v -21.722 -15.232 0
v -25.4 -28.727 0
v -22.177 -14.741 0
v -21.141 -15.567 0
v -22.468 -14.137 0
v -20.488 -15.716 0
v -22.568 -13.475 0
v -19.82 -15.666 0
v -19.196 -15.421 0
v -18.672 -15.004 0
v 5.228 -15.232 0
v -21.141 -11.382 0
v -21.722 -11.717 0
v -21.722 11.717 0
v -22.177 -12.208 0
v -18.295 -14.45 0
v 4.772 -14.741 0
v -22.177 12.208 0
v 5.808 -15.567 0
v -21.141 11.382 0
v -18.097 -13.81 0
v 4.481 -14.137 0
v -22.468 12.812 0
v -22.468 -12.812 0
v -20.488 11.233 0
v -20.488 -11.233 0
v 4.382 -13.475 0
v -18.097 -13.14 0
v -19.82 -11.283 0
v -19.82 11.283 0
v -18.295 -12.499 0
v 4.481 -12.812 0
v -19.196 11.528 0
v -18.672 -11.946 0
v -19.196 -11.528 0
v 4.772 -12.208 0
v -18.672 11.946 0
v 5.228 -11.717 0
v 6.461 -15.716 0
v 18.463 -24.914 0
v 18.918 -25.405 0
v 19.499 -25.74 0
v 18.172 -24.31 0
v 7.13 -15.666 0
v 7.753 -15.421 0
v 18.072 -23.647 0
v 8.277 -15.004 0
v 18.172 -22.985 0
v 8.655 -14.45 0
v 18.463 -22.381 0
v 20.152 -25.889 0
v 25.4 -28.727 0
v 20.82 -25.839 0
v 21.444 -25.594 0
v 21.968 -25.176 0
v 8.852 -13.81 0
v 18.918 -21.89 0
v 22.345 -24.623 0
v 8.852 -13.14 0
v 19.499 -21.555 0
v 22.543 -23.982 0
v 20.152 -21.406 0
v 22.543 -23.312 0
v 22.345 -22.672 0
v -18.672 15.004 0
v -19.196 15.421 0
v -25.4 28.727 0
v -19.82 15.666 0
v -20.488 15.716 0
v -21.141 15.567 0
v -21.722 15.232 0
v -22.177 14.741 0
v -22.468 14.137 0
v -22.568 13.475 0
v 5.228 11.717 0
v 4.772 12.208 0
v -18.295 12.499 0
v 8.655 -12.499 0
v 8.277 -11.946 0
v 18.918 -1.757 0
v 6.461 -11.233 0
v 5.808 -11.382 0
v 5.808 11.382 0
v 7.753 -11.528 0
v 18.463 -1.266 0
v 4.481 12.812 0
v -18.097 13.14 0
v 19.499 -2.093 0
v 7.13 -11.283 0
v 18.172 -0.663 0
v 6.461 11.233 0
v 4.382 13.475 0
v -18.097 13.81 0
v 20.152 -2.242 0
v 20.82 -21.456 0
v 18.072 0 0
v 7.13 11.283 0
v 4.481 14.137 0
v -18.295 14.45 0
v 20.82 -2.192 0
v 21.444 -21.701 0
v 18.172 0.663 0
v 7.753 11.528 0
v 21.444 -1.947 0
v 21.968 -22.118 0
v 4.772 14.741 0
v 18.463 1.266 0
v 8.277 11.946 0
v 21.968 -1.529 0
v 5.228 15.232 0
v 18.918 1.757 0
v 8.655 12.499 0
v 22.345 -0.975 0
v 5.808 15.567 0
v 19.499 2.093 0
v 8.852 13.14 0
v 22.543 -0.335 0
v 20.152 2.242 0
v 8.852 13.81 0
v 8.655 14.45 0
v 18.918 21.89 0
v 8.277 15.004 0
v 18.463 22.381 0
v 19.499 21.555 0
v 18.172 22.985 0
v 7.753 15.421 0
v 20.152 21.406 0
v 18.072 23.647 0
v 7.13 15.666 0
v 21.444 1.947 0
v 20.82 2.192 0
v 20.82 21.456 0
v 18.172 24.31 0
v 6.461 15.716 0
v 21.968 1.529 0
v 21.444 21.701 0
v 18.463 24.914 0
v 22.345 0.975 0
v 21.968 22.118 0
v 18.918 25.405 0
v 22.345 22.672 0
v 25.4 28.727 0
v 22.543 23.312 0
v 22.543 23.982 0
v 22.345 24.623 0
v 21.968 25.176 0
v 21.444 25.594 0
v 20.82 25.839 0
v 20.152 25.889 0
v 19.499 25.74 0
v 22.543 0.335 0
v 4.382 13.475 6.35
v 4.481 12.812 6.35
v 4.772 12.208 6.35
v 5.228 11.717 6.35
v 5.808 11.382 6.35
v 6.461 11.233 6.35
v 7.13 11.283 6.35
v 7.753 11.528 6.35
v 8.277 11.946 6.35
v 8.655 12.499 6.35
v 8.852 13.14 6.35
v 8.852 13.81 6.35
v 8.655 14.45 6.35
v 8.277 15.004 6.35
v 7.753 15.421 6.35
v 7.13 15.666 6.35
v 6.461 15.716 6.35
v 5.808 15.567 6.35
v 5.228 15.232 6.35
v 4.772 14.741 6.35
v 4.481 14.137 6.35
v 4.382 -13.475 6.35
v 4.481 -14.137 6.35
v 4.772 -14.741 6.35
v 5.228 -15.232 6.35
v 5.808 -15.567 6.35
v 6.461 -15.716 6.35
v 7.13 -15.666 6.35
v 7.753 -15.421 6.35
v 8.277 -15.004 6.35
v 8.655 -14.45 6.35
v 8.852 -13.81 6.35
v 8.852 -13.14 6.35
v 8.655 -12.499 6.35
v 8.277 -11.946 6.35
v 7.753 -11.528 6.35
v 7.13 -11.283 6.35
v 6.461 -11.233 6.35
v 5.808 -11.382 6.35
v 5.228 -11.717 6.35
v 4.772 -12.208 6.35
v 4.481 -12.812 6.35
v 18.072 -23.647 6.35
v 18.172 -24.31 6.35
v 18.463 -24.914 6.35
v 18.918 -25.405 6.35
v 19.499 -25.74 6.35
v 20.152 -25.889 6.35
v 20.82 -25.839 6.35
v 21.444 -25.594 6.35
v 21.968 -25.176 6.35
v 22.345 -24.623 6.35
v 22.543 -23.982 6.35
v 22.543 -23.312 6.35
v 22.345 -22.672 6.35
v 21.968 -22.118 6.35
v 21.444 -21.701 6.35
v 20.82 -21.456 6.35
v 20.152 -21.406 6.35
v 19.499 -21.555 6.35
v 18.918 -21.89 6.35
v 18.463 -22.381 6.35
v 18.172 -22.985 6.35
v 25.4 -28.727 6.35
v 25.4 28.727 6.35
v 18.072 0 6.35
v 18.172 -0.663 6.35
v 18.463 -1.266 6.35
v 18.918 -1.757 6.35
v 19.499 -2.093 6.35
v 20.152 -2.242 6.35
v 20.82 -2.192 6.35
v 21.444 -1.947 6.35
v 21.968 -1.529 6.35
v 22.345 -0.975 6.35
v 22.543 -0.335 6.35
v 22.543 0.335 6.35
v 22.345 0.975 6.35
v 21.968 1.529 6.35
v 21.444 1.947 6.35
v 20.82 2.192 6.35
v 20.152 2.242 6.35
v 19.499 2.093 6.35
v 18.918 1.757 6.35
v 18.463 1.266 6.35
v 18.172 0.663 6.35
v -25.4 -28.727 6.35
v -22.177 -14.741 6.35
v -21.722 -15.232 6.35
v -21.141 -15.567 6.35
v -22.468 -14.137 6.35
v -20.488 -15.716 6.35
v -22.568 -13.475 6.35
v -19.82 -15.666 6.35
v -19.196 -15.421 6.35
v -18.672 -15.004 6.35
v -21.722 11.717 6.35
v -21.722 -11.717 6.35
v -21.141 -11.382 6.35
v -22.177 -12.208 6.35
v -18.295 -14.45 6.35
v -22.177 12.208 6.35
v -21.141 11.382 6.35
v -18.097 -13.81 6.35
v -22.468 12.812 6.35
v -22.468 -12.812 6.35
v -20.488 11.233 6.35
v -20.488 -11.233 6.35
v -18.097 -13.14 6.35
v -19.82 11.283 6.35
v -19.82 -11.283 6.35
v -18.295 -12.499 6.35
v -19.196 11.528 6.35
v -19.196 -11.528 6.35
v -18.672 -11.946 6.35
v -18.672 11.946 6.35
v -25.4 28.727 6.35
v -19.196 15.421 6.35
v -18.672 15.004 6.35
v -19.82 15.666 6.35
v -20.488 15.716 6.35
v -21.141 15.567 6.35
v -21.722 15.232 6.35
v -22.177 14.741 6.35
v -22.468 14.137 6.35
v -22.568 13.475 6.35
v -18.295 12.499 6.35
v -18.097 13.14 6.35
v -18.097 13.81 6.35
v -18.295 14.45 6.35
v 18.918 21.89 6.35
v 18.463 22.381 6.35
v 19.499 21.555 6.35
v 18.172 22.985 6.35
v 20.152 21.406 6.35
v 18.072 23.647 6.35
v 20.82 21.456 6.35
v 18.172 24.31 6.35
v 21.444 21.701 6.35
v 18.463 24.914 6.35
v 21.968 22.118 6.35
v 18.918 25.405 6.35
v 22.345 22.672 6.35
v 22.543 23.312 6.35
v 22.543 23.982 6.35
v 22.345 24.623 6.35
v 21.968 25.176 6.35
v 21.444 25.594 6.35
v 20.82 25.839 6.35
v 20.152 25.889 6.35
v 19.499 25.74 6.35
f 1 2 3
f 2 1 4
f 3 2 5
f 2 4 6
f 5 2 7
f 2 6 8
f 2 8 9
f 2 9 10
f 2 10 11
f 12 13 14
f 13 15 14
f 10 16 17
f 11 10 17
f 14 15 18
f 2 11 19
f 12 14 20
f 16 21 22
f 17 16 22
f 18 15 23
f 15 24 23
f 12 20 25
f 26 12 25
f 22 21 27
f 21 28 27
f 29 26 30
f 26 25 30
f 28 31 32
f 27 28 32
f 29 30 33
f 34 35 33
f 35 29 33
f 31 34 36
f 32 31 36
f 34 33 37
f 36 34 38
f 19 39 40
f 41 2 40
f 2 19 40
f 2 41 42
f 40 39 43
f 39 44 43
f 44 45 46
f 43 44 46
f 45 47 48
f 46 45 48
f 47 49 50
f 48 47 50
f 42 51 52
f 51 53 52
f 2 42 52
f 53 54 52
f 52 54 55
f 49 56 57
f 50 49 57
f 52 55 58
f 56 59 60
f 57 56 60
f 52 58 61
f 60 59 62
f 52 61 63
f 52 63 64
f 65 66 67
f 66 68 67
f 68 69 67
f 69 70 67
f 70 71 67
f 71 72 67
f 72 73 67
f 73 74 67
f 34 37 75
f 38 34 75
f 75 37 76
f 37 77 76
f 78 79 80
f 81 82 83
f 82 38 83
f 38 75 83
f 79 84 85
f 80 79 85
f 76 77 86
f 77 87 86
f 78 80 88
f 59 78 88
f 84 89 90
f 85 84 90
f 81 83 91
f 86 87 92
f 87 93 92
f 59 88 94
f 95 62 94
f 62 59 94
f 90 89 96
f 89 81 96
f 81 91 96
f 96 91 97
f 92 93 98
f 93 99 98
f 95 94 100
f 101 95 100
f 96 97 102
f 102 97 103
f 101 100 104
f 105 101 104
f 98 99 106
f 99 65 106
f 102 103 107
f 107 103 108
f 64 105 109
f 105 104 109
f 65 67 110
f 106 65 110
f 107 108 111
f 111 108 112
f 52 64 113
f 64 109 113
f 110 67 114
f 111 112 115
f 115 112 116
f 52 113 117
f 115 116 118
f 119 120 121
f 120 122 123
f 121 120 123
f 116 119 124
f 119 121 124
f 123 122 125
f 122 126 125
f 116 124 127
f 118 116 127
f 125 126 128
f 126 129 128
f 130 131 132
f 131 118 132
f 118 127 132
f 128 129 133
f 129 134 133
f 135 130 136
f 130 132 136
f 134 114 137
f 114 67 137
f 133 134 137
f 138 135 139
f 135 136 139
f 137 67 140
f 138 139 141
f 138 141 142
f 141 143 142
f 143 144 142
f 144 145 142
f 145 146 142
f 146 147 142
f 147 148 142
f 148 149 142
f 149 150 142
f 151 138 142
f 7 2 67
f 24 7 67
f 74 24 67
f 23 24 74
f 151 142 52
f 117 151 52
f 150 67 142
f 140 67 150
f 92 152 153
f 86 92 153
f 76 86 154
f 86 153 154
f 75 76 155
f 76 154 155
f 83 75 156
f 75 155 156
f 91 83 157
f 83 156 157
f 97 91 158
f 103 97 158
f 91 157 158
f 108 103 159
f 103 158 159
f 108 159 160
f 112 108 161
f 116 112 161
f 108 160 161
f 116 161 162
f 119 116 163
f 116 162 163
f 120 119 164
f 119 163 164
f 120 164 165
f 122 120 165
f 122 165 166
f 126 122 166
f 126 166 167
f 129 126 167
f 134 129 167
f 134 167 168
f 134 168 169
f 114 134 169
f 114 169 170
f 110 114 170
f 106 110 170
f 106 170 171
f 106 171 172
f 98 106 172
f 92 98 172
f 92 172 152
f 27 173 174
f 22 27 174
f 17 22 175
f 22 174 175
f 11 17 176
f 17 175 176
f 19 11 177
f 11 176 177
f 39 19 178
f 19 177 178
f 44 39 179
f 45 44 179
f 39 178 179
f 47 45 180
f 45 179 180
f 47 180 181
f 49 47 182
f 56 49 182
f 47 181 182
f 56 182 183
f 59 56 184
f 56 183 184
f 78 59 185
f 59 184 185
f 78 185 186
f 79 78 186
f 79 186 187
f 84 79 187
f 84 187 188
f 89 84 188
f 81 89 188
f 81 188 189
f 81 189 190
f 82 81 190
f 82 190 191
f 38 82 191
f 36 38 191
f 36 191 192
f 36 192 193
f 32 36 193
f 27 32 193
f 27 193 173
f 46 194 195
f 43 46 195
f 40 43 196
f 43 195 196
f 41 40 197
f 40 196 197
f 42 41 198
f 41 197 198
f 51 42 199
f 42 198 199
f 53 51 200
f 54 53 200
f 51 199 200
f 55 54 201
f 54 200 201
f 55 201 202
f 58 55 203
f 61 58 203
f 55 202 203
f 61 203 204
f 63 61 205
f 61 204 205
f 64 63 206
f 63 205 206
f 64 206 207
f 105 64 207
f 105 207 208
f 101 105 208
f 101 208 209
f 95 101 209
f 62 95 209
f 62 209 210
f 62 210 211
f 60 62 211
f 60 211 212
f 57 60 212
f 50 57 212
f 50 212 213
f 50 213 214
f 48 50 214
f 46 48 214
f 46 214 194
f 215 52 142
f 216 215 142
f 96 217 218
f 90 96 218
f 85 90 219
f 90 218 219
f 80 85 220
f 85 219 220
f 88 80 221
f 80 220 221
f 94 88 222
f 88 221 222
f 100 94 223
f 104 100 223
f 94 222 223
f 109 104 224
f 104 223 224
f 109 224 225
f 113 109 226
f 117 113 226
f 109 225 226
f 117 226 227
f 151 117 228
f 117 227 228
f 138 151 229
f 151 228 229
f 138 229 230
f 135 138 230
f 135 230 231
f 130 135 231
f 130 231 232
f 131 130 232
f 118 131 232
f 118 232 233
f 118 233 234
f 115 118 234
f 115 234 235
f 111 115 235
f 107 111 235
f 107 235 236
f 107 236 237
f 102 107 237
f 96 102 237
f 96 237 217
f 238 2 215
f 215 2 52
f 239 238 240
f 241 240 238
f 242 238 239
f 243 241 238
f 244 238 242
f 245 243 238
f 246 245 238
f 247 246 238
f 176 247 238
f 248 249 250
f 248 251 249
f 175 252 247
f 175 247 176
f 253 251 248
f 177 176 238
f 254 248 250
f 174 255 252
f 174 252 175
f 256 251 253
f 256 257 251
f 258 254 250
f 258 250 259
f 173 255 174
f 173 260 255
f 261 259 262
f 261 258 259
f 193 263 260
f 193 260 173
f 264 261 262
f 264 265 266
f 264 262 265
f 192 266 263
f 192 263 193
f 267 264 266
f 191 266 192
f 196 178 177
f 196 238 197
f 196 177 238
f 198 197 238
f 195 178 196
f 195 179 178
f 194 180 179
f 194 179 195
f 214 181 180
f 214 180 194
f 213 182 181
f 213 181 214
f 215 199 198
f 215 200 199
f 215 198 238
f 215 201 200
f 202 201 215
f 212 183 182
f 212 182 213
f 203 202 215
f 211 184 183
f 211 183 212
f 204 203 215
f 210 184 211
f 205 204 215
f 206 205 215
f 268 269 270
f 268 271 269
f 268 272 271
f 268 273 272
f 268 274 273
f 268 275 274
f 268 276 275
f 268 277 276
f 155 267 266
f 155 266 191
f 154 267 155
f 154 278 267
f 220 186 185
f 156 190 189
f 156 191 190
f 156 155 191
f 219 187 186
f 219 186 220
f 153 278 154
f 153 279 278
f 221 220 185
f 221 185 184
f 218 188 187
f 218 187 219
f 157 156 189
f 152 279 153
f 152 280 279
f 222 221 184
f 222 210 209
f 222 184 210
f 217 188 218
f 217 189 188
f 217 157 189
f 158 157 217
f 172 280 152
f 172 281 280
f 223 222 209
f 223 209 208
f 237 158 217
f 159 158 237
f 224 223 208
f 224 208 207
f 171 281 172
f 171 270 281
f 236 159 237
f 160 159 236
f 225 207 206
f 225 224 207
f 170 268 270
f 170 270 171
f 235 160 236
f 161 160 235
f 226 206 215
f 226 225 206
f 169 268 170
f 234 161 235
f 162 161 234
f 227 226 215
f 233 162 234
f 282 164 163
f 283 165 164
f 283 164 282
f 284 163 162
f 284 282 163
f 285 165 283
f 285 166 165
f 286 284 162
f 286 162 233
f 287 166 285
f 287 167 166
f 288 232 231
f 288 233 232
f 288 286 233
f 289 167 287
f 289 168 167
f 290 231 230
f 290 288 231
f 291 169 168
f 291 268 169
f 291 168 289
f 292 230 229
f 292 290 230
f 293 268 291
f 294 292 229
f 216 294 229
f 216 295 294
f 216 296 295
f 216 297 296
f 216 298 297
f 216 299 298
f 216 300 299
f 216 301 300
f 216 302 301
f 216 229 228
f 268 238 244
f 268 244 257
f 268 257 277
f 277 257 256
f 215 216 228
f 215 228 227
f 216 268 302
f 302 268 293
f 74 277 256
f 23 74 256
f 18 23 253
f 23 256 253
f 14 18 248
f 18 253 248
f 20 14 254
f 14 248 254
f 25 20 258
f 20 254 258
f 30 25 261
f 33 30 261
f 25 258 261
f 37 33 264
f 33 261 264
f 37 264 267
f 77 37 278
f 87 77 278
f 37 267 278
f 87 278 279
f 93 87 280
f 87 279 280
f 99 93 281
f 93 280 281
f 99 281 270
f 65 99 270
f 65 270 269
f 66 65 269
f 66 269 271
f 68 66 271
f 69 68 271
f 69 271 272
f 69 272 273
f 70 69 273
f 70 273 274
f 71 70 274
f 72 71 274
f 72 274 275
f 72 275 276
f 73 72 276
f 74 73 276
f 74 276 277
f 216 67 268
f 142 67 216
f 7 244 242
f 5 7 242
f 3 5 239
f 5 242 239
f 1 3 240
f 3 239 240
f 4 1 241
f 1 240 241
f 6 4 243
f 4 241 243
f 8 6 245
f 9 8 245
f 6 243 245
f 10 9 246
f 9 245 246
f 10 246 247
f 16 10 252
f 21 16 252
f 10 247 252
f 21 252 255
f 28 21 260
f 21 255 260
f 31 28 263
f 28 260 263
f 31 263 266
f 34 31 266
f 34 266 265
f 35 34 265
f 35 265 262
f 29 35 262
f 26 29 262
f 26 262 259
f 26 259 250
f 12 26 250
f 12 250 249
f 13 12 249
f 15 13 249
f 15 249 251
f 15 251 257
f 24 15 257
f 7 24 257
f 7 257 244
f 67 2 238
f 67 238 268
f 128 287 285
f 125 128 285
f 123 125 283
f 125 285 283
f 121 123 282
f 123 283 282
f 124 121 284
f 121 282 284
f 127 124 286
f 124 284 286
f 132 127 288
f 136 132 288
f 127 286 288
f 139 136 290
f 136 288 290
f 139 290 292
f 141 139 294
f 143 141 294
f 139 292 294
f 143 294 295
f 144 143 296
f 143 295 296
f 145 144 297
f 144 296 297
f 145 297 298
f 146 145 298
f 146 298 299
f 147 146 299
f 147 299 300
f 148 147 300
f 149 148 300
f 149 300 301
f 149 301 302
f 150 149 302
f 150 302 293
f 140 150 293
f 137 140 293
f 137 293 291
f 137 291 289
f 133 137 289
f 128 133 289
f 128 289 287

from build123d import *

# Parameters (mm, degrees)
F0_W     = 50.8
F0_H     = 57.4548
F1_DEPTH = 6.35
F2_D     = 4.4958
F3_D     = 4.4958
F4_D     = 4.4958
F5_D     = 4.4958
F6_D     = 4.4958
F7_D     = 4.4958
F8_D     = 4.4958


with BuildPart() as f1:
    # F0 (on Top) → F1 (new body)
    with BuildSketch(Plane.XY):
        Rectangle(F0_W, F0_H)
    extrude(amount=F1_DEPTH)

    # F2 (through all)
    with Locations(Plane(origin=(0, 0, 0), x_dir=(1, 0, 0), z_dir=(0, 0, -1))):
        with Locations((-20.32, 13.4747)):
            Hole(F2_D / 2)

    # F3 (through all)
    with Locations(Plane(origin=(0, 0, 0), x_dir=(1, 0, 0), z_dir=(0, 0, -1))):
        with Locations((-20.32, -13.4747)):
            Hole(F3_D / 2)

    # F4 (through all)
    with Locations(Plane(origin=(0, 0, 0), x_dir=(1, 0, 0), z_dir=(0, 0, -1))):
        with Locations((6.6294, -13.4747)):
            Hole(F4_D / 2)

    # F5 (through all)
    with Locations(Plane(origin=(0, 0, 0), x_dir=(1, 0, 0), z_dir=(0, 0, -1))):
        with Locations((6.6294, 13.4747)):
            Hole(F5_D / 2)

    # F6 (through all)
    with Locations(Plane(origin=(0, 0, 0), x_dir=(1, 0, 0), z_dir=(0, 0, -1))):
        with Locations((20.32, 23.6474)):
            Hole(F6_D / 2)

    # F7 (through all)
    with Locations(Plane(origin=(0, 0, 0), x_dir=(1, 0, 0), z_dir=(0, 0, -1))):
        with Locations((20.32, 0)):
            Hole(F7_D / 2)

    # F8 (through all)
    with Locations(Plane(origin=(0, 0, 0), x_dir=(1, 0, 0), z_dir=(0, 0, -1))):
        with Locations((20.32, -23.6474)):
            Hole(F8_D / 2)


solid = f1.part
